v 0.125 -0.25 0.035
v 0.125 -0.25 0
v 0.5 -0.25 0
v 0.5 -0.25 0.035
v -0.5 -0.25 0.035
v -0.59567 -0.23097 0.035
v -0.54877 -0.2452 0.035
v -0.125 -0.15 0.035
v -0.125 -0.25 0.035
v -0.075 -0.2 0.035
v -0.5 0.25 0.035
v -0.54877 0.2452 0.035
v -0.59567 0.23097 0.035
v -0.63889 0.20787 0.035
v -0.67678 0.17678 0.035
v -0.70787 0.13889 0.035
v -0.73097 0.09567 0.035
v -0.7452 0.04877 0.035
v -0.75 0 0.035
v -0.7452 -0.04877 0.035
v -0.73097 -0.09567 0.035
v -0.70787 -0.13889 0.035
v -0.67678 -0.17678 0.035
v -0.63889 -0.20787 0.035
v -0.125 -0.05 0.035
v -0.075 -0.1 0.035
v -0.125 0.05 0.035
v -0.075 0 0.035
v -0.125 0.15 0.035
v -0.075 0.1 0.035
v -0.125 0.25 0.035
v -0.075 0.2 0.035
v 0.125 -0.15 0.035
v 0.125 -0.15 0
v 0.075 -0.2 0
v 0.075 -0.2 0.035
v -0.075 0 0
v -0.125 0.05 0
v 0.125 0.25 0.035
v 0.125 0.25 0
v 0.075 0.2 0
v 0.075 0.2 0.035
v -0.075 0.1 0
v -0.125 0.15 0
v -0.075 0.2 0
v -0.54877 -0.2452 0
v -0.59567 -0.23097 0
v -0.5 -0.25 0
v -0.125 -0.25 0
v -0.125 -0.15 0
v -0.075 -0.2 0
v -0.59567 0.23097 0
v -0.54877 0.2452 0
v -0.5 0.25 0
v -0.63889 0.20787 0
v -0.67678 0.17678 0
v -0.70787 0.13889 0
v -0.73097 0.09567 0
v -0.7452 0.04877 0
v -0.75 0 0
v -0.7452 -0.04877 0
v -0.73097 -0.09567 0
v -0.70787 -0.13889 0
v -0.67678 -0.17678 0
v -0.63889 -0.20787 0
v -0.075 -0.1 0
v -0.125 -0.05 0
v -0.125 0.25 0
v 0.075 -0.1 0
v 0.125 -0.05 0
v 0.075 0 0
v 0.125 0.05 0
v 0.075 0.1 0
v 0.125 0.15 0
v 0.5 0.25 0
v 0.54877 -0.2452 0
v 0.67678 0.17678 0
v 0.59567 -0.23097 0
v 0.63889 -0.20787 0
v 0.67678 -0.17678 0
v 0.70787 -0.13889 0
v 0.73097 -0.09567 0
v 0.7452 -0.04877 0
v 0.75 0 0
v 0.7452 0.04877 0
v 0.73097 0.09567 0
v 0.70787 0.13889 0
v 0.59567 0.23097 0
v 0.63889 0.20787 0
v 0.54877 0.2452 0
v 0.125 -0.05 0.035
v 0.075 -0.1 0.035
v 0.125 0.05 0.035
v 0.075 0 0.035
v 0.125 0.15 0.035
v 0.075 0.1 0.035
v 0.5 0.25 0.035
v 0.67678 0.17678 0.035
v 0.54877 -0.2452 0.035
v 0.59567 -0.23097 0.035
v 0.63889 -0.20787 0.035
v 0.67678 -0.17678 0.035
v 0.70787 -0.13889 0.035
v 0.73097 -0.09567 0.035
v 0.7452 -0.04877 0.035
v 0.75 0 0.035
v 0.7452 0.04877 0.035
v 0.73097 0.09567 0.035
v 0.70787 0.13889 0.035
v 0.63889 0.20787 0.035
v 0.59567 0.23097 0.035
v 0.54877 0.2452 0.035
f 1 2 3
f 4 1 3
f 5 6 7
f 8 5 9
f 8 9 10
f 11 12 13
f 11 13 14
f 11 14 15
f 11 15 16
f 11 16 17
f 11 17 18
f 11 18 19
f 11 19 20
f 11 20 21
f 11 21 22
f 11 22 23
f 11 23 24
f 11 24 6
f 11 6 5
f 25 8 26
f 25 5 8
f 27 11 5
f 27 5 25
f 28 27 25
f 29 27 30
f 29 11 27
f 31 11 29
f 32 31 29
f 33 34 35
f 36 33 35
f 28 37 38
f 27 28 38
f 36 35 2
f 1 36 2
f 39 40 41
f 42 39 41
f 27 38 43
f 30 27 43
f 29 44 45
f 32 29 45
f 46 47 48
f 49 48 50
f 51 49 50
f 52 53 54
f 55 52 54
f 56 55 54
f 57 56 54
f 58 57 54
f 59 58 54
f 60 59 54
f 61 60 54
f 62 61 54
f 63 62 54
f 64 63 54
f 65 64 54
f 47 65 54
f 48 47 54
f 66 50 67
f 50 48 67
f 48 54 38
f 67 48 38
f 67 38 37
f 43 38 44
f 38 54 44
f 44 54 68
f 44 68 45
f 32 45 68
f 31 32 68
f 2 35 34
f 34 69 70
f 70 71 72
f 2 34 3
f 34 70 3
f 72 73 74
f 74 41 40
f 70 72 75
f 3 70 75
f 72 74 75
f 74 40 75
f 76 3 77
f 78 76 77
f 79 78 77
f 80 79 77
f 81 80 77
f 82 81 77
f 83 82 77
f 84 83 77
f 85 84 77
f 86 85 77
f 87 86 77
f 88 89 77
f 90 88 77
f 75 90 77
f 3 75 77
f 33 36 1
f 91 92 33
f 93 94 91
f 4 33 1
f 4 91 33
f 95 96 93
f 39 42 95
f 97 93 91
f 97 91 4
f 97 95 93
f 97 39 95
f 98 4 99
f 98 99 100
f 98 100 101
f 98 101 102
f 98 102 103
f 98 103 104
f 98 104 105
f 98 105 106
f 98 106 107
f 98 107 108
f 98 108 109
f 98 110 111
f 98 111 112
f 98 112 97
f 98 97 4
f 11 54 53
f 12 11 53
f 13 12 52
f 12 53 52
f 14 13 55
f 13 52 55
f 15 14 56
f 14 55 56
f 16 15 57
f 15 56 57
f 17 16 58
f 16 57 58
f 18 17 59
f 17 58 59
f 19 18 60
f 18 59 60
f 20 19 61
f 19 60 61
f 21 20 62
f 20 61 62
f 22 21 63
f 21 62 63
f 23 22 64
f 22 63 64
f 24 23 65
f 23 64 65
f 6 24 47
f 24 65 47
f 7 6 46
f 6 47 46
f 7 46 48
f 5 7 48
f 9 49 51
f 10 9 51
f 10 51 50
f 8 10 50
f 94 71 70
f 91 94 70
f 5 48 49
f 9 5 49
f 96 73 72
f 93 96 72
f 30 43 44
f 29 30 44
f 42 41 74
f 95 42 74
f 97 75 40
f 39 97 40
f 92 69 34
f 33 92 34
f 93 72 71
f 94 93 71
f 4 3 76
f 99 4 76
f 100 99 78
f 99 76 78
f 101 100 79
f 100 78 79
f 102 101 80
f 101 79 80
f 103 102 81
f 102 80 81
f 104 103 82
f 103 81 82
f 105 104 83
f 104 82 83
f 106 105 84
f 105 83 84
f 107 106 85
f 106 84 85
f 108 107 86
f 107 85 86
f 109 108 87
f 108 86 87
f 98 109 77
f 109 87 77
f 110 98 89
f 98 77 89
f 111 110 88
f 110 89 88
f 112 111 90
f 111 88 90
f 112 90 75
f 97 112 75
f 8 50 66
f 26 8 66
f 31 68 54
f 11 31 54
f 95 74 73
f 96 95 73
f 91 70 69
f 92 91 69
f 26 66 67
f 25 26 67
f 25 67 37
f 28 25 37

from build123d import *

# Parameters (mm, degrees)
F1_DEPTH = 0.035


with BuildPart() as f1:
    # F0 (on Top) → F1 (new body)
    with BuildSketch(Plane.XY):
        with BuildLine():
            Line((-0.125, 0.25), (-0.5, 0.25))
            ThreePointArc((-0.5, 0.25), (-0.75, 0), (-0.5, -0.25))
            Line((-0.5, -0.25), (-0.125, -0.25))
            Line((-0.125, -0.25), (-0.075, -0.2))
            Line((-0.075, -0.2), (-0.125, -0.15))
            Line((-0.125, -0.15), (-0.075, -0.1))
            Line((-0.075, -0.1), (-0.125, -0.05))
            Line((-0.125, -0.05), (-0.075, 0))
            Line((-0.075, 0), (-0.125, 0.05))
            Line((-0.125, 0.05), (-0.075, 0.1))
            Line((-0.075, 0.1), (-0.125, 0.15))
            Line((-0.125, 0.15), (-0.075, 0.2))
            Line((-0.075, 0.2), (-0.125, 0.25))
        make_face()
        with BuildLine():
            Line((0.075, 0.1), (0.125, 0.05))
            Line((0.125, 0.05), (0.075, 0))
            Line((0.075, 0), (0.125, -0.05))
            Line((0.125, -0.05), (0.075, -0.1))
            Line((0.075, -0.1), (0.125, -0.15))
            Line((0.125, -0.15), (0.075, -0.2))
            Line((0.075, -0.2), (0.125, -0.25))
            Line((0.125, -0.25), (0.5, -0.25))
            ThreePointArc((0.5, -0.25), (0.75, 0), (0.5, 0.25))
            Line((0.5, 0.25), (0.125, 0.25))
            Line((0.125, 0.25), (0.075, 0.2))
            Line((0.075, 0.2), (0.125, 0.15))
            Line((0.125, 0.15), (0.075, 0.1))
        make_face()
    extrude(amount=F1_DEPTH)


solid = f1.part
